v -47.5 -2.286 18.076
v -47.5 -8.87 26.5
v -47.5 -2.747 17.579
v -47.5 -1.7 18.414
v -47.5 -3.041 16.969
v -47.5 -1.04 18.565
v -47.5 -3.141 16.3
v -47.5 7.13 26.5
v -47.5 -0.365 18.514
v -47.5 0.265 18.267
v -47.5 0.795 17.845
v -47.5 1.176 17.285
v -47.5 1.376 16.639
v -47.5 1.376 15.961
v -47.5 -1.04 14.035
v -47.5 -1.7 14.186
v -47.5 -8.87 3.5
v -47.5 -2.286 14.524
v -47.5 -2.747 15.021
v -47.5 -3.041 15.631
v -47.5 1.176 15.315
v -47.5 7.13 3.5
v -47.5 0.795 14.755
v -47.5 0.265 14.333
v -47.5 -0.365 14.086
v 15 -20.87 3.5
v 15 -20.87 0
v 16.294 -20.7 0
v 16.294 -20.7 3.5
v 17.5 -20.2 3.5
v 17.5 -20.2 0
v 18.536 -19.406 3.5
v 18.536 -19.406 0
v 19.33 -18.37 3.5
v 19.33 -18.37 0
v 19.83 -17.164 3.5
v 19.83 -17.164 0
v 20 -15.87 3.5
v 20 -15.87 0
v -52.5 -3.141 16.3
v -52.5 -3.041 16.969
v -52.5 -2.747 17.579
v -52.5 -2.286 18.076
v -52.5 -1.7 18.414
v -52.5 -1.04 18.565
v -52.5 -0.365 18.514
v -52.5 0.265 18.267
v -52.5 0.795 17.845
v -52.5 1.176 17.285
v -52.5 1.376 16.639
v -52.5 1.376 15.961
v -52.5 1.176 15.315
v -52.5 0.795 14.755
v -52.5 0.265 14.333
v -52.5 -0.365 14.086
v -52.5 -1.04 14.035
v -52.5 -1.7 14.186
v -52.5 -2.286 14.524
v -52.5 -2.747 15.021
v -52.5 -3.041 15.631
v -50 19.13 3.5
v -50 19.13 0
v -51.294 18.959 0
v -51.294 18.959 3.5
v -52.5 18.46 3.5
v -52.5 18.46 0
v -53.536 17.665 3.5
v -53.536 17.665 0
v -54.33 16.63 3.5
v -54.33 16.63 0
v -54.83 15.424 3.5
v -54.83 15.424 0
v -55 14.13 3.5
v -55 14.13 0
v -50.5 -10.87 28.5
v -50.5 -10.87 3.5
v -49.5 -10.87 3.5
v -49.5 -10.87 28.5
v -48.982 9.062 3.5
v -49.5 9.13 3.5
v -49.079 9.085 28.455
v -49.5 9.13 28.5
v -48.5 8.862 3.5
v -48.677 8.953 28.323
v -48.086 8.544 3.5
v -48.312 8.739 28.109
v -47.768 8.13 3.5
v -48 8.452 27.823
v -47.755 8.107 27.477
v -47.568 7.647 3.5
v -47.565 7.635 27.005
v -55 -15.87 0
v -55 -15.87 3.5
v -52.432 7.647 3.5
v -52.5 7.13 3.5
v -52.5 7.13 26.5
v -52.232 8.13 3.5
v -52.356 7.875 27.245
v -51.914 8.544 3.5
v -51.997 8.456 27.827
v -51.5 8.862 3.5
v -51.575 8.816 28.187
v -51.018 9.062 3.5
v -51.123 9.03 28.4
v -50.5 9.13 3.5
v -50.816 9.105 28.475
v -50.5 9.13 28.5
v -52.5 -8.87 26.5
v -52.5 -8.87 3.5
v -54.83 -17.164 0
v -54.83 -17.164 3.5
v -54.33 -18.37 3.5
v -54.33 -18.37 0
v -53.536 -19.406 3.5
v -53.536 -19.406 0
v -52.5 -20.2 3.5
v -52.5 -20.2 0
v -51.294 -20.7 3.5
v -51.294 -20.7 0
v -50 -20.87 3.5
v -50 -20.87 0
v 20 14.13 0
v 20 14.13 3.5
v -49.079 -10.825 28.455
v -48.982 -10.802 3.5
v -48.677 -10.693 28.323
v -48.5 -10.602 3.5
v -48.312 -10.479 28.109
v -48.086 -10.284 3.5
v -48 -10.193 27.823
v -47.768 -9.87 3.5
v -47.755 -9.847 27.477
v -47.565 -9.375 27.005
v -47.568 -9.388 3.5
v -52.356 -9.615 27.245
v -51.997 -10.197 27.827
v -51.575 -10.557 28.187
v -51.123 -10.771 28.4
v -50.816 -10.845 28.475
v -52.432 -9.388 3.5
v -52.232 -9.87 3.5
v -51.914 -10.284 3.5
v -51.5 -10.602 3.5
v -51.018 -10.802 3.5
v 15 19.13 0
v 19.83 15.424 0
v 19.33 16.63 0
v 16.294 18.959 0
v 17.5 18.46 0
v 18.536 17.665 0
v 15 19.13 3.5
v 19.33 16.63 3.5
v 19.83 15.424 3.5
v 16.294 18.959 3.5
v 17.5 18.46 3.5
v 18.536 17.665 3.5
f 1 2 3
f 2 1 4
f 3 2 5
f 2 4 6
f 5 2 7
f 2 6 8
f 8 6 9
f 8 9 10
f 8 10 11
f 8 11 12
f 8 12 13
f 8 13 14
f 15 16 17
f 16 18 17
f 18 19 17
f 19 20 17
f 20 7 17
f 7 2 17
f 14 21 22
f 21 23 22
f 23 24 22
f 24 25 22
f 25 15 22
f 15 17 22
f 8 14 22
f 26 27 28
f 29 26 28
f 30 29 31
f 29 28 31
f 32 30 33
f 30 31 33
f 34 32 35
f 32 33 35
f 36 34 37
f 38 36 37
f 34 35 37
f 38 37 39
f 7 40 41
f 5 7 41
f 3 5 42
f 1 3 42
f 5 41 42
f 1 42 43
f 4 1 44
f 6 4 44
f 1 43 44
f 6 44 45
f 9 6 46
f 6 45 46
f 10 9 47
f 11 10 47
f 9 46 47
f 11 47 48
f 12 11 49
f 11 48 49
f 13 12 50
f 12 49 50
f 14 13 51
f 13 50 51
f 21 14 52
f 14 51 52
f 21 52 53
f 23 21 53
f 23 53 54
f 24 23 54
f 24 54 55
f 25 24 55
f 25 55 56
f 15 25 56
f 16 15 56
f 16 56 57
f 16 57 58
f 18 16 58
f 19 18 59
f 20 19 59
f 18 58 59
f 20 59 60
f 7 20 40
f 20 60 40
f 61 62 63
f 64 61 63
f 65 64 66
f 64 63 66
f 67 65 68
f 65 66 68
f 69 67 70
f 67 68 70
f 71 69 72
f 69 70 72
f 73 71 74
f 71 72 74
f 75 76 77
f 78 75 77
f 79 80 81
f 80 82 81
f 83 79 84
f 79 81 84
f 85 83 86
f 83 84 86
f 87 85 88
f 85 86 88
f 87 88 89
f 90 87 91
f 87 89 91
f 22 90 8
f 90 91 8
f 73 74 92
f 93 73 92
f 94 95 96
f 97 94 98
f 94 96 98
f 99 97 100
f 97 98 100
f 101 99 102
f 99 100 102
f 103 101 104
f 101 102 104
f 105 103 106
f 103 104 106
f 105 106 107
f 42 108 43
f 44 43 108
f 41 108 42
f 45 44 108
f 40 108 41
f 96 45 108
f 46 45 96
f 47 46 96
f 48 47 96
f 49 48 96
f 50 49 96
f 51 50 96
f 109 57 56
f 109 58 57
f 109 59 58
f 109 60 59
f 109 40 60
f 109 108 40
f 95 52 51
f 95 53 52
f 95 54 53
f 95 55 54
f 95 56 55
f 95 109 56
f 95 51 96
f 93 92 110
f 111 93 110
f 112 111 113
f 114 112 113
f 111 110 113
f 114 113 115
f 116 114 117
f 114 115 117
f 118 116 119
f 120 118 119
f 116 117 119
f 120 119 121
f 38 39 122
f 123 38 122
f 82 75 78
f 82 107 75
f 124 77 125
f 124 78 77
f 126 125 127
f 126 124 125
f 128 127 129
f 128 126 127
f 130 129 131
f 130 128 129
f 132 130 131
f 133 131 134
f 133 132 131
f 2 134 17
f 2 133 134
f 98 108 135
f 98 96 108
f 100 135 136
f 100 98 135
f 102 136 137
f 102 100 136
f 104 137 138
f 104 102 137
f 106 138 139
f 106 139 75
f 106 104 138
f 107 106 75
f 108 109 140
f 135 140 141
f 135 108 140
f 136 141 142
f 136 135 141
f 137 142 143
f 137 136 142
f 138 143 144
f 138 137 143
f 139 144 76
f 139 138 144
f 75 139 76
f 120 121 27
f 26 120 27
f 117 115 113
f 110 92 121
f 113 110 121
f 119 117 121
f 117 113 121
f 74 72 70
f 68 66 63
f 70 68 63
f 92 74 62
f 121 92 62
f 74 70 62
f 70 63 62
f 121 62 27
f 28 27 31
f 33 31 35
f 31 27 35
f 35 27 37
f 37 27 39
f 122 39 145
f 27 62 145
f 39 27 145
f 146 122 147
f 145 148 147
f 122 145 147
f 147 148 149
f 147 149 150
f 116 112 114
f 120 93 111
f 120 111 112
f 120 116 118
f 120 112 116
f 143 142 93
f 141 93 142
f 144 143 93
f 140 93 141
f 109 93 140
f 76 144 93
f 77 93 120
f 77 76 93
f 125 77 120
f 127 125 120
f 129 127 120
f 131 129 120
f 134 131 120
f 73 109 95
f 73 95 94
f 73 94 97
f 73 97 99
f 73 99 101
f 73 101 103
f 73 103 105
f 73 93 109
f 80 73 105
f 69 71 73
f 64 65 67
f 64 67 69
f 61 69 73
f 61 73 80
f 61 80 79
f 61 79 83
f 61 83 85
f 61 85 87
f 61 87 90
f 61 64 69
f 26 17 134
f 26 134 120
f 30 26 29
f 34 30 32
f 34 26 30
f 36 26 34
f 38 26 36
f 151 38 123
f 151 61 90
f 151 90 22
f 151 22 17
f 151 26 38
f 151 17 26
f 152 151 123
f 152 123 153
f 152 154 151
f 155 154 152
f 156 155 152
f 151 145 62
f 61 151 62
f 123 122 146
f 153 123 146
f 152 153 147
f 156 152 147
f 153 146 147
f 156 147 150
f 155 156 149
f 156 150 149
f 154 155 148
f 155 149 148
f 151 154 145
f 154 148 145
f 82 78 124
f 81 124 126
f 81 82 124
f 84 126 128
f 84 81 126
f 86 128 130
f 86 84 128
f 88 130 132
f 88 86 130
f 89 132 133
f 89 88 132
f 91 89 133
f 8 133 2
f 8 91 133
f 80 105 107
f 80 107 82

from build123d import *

# Parameters (mm, degrees)
F0_W     = 2.5
F0_H     = 20
F1_DEPTH = 3.5
F0_W_2   = 5
F2_DEPTH = 28.5
F3_R     = 2.271243
F4_DEPTH = 5
F5_R     = 2


with BuildPart() as f1:
    # F0 (on Top) → F1 (new body)
    with BuildSketch(Plane.XY):
        with BuildLine():
            Line((15.000003, 19.129753), (-49.999997, 19.129753))
            ThreePointArc((-49.999997, 19.129753), (-53.535531, 17.665286), (-54.999997, 14.129753))
            Line((-54.999997, 14.129753), (-54.999997, 9.129753))
            Line((-54.999997, 9.129753), (-52.499997, 9.129753))
            Line((-52.499997, 9.129753), (-47.499997, 9.129753))
            Line((-47.499997, 9.129753), (-44.999997, 9.129753))
            Line((-44.999997, 9.129753), (-44.999997, -10.870247))
            Line((-44.999997, -10.870247), (-47.499997, -10.870247))
            Line((-47.499997, -10.870247), (-52.499997, -10.870247))
            Line((-52.499997, -10.870247), (-54.999997, -10.870247))
            Line((-54.999997, -10.870247), (-54.999997, -15.870247))
            ThreePointArc((-54.999997, -15.870247), (-53.535531, -19.405781), (-49.999997, -20.870247))
            Line((-49.999997, -20.870247), (15.000003, -20.870247))
            ThreePointArc((15.000003, -20.870247), (18.535537, -19.405781), (20.000003, -15.870247))
            Line((20.000003, -15.870247), (20.000003, 14.129753))
            ThreePointArc((20.000003, 14.129753), (18.535537, 17.665286), (15.000003, 19.129753))
        make_face()
        with Locations((-53.749997, -0.870247)):
            Rectangle(F0_W, F0_H)
        with Locations((-46.249997, -0.870247)):
            Rectangle(F0_W, F0_H)
    extrude(amount=F1_DEPTH)

    # F0 (on Top) → F2 (join)
    with BuildSketch(Plane.XY):
        with Locations((-49.999997, -0.870247)):
            Rectangle(F0_W_2, F0_H)
    extrude(amount=F2_DEPTH)

    # F3 (on face) → F4 (cut)
    with BuildSketch(Plane(origin=(-52.499997, 0, 0), x_dir=(0, -1, 0), z_dir=(-1, 0, 0))):
        with Locations((0.870247, 16.3)):
            Circle(F3_R)
    extrude(amount=-F4_DEPTH, mode=Mode.SUBTRACT)

    # F5
    f5_edges = [f1.edges().sort_by_distance(p)[0] for p in [
        (-52.499997, -0.870247, 28.5),
        (-47.499997, -0.870247, 28.5),
        (-47.499997, -10.870247, 16),
        (-52.499997, -10.870247, 16),
        (-52.499997, 9.129753, 16),
        (-47.499997, 9.129753, 16),
    ]]
    fillet(f5_edges, radius=F5_R)


solid = f1.part
